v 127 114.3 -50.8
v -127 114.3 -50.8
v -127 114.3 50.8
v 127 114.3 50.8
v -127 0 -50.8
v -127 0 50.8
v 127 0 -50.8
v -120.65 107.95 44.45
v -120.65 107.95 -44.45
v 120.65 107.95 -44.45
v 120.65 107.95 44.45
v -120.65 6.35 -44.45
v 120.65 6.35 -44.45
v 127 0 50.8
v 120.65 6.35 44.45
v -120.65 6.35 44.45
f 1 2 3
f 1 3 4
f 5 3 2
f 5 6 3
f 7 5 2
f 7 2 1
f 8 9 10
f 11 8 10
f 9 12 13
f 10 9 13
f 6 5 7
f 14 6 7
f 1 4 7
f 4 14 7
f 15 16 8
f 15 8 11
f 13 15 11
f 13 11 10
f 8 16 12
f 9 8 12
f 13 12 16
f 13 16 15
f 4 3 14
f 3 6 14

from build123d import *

# Parameters (mm, degrees)
SKETCH1_W           = 254
SKETCH1_H           = 101.6
BOSS_EXTRUDE1_DEPTH = 6.35
SKETCH5_W           = 254
SKETCH5_H           = 101.6
SKETCH5_W_2         = 241.3
SKETCH5_H_2         = 88.9
BOSS_EXTRUDE4_DEPTH = 101.6
SKETCH6_W           = 254
SKETCH6_H           = 101.6
BOSS_EXTRUDE5_DEPTH = 6.35


with BuildPart() as part:
    # Sketch1 → Boss-Extrude1 (new body)
    with BuildSketch(Plane(origin=(0, 0, 0), x_dir=(1, 0, 0), z_dir=(0, 1, 0))):
        Rectangle(SKETCH1_W, SKETCH1_H)
    extrude(amount=BOSS_EXTRUDE1_DEPTH)

    # Sketch5 → Boss-Extrude4 (add)
    with BuildSketch(Plane(origin=(0, 6.35, 0), x_dir=(1, 0, 0), z_dir=(0, 1, 0))):
        Rectangle(SKETCH5_W, SKETCH5_H)
        Rectangle(SKETCH5_W_2, SKETCH5_H_2, mode=Mode.SUBTRACT)
    extrude(amount=BOSS_EXTRUDE4_DEPTH)

    # Sketch6 → Boss-Extrude5 (add)
    with BuildSketch(Plane(origin=(0, 107.95, 0), x_dir=(1, 0, 0), z_dir=(0, 1, 0))):
        Rectangle(SKETCH6_W, SKETCH6_H)
    extrude(amount=BOSS_EXTRUDE5_DEPTH)


solid = part.part
